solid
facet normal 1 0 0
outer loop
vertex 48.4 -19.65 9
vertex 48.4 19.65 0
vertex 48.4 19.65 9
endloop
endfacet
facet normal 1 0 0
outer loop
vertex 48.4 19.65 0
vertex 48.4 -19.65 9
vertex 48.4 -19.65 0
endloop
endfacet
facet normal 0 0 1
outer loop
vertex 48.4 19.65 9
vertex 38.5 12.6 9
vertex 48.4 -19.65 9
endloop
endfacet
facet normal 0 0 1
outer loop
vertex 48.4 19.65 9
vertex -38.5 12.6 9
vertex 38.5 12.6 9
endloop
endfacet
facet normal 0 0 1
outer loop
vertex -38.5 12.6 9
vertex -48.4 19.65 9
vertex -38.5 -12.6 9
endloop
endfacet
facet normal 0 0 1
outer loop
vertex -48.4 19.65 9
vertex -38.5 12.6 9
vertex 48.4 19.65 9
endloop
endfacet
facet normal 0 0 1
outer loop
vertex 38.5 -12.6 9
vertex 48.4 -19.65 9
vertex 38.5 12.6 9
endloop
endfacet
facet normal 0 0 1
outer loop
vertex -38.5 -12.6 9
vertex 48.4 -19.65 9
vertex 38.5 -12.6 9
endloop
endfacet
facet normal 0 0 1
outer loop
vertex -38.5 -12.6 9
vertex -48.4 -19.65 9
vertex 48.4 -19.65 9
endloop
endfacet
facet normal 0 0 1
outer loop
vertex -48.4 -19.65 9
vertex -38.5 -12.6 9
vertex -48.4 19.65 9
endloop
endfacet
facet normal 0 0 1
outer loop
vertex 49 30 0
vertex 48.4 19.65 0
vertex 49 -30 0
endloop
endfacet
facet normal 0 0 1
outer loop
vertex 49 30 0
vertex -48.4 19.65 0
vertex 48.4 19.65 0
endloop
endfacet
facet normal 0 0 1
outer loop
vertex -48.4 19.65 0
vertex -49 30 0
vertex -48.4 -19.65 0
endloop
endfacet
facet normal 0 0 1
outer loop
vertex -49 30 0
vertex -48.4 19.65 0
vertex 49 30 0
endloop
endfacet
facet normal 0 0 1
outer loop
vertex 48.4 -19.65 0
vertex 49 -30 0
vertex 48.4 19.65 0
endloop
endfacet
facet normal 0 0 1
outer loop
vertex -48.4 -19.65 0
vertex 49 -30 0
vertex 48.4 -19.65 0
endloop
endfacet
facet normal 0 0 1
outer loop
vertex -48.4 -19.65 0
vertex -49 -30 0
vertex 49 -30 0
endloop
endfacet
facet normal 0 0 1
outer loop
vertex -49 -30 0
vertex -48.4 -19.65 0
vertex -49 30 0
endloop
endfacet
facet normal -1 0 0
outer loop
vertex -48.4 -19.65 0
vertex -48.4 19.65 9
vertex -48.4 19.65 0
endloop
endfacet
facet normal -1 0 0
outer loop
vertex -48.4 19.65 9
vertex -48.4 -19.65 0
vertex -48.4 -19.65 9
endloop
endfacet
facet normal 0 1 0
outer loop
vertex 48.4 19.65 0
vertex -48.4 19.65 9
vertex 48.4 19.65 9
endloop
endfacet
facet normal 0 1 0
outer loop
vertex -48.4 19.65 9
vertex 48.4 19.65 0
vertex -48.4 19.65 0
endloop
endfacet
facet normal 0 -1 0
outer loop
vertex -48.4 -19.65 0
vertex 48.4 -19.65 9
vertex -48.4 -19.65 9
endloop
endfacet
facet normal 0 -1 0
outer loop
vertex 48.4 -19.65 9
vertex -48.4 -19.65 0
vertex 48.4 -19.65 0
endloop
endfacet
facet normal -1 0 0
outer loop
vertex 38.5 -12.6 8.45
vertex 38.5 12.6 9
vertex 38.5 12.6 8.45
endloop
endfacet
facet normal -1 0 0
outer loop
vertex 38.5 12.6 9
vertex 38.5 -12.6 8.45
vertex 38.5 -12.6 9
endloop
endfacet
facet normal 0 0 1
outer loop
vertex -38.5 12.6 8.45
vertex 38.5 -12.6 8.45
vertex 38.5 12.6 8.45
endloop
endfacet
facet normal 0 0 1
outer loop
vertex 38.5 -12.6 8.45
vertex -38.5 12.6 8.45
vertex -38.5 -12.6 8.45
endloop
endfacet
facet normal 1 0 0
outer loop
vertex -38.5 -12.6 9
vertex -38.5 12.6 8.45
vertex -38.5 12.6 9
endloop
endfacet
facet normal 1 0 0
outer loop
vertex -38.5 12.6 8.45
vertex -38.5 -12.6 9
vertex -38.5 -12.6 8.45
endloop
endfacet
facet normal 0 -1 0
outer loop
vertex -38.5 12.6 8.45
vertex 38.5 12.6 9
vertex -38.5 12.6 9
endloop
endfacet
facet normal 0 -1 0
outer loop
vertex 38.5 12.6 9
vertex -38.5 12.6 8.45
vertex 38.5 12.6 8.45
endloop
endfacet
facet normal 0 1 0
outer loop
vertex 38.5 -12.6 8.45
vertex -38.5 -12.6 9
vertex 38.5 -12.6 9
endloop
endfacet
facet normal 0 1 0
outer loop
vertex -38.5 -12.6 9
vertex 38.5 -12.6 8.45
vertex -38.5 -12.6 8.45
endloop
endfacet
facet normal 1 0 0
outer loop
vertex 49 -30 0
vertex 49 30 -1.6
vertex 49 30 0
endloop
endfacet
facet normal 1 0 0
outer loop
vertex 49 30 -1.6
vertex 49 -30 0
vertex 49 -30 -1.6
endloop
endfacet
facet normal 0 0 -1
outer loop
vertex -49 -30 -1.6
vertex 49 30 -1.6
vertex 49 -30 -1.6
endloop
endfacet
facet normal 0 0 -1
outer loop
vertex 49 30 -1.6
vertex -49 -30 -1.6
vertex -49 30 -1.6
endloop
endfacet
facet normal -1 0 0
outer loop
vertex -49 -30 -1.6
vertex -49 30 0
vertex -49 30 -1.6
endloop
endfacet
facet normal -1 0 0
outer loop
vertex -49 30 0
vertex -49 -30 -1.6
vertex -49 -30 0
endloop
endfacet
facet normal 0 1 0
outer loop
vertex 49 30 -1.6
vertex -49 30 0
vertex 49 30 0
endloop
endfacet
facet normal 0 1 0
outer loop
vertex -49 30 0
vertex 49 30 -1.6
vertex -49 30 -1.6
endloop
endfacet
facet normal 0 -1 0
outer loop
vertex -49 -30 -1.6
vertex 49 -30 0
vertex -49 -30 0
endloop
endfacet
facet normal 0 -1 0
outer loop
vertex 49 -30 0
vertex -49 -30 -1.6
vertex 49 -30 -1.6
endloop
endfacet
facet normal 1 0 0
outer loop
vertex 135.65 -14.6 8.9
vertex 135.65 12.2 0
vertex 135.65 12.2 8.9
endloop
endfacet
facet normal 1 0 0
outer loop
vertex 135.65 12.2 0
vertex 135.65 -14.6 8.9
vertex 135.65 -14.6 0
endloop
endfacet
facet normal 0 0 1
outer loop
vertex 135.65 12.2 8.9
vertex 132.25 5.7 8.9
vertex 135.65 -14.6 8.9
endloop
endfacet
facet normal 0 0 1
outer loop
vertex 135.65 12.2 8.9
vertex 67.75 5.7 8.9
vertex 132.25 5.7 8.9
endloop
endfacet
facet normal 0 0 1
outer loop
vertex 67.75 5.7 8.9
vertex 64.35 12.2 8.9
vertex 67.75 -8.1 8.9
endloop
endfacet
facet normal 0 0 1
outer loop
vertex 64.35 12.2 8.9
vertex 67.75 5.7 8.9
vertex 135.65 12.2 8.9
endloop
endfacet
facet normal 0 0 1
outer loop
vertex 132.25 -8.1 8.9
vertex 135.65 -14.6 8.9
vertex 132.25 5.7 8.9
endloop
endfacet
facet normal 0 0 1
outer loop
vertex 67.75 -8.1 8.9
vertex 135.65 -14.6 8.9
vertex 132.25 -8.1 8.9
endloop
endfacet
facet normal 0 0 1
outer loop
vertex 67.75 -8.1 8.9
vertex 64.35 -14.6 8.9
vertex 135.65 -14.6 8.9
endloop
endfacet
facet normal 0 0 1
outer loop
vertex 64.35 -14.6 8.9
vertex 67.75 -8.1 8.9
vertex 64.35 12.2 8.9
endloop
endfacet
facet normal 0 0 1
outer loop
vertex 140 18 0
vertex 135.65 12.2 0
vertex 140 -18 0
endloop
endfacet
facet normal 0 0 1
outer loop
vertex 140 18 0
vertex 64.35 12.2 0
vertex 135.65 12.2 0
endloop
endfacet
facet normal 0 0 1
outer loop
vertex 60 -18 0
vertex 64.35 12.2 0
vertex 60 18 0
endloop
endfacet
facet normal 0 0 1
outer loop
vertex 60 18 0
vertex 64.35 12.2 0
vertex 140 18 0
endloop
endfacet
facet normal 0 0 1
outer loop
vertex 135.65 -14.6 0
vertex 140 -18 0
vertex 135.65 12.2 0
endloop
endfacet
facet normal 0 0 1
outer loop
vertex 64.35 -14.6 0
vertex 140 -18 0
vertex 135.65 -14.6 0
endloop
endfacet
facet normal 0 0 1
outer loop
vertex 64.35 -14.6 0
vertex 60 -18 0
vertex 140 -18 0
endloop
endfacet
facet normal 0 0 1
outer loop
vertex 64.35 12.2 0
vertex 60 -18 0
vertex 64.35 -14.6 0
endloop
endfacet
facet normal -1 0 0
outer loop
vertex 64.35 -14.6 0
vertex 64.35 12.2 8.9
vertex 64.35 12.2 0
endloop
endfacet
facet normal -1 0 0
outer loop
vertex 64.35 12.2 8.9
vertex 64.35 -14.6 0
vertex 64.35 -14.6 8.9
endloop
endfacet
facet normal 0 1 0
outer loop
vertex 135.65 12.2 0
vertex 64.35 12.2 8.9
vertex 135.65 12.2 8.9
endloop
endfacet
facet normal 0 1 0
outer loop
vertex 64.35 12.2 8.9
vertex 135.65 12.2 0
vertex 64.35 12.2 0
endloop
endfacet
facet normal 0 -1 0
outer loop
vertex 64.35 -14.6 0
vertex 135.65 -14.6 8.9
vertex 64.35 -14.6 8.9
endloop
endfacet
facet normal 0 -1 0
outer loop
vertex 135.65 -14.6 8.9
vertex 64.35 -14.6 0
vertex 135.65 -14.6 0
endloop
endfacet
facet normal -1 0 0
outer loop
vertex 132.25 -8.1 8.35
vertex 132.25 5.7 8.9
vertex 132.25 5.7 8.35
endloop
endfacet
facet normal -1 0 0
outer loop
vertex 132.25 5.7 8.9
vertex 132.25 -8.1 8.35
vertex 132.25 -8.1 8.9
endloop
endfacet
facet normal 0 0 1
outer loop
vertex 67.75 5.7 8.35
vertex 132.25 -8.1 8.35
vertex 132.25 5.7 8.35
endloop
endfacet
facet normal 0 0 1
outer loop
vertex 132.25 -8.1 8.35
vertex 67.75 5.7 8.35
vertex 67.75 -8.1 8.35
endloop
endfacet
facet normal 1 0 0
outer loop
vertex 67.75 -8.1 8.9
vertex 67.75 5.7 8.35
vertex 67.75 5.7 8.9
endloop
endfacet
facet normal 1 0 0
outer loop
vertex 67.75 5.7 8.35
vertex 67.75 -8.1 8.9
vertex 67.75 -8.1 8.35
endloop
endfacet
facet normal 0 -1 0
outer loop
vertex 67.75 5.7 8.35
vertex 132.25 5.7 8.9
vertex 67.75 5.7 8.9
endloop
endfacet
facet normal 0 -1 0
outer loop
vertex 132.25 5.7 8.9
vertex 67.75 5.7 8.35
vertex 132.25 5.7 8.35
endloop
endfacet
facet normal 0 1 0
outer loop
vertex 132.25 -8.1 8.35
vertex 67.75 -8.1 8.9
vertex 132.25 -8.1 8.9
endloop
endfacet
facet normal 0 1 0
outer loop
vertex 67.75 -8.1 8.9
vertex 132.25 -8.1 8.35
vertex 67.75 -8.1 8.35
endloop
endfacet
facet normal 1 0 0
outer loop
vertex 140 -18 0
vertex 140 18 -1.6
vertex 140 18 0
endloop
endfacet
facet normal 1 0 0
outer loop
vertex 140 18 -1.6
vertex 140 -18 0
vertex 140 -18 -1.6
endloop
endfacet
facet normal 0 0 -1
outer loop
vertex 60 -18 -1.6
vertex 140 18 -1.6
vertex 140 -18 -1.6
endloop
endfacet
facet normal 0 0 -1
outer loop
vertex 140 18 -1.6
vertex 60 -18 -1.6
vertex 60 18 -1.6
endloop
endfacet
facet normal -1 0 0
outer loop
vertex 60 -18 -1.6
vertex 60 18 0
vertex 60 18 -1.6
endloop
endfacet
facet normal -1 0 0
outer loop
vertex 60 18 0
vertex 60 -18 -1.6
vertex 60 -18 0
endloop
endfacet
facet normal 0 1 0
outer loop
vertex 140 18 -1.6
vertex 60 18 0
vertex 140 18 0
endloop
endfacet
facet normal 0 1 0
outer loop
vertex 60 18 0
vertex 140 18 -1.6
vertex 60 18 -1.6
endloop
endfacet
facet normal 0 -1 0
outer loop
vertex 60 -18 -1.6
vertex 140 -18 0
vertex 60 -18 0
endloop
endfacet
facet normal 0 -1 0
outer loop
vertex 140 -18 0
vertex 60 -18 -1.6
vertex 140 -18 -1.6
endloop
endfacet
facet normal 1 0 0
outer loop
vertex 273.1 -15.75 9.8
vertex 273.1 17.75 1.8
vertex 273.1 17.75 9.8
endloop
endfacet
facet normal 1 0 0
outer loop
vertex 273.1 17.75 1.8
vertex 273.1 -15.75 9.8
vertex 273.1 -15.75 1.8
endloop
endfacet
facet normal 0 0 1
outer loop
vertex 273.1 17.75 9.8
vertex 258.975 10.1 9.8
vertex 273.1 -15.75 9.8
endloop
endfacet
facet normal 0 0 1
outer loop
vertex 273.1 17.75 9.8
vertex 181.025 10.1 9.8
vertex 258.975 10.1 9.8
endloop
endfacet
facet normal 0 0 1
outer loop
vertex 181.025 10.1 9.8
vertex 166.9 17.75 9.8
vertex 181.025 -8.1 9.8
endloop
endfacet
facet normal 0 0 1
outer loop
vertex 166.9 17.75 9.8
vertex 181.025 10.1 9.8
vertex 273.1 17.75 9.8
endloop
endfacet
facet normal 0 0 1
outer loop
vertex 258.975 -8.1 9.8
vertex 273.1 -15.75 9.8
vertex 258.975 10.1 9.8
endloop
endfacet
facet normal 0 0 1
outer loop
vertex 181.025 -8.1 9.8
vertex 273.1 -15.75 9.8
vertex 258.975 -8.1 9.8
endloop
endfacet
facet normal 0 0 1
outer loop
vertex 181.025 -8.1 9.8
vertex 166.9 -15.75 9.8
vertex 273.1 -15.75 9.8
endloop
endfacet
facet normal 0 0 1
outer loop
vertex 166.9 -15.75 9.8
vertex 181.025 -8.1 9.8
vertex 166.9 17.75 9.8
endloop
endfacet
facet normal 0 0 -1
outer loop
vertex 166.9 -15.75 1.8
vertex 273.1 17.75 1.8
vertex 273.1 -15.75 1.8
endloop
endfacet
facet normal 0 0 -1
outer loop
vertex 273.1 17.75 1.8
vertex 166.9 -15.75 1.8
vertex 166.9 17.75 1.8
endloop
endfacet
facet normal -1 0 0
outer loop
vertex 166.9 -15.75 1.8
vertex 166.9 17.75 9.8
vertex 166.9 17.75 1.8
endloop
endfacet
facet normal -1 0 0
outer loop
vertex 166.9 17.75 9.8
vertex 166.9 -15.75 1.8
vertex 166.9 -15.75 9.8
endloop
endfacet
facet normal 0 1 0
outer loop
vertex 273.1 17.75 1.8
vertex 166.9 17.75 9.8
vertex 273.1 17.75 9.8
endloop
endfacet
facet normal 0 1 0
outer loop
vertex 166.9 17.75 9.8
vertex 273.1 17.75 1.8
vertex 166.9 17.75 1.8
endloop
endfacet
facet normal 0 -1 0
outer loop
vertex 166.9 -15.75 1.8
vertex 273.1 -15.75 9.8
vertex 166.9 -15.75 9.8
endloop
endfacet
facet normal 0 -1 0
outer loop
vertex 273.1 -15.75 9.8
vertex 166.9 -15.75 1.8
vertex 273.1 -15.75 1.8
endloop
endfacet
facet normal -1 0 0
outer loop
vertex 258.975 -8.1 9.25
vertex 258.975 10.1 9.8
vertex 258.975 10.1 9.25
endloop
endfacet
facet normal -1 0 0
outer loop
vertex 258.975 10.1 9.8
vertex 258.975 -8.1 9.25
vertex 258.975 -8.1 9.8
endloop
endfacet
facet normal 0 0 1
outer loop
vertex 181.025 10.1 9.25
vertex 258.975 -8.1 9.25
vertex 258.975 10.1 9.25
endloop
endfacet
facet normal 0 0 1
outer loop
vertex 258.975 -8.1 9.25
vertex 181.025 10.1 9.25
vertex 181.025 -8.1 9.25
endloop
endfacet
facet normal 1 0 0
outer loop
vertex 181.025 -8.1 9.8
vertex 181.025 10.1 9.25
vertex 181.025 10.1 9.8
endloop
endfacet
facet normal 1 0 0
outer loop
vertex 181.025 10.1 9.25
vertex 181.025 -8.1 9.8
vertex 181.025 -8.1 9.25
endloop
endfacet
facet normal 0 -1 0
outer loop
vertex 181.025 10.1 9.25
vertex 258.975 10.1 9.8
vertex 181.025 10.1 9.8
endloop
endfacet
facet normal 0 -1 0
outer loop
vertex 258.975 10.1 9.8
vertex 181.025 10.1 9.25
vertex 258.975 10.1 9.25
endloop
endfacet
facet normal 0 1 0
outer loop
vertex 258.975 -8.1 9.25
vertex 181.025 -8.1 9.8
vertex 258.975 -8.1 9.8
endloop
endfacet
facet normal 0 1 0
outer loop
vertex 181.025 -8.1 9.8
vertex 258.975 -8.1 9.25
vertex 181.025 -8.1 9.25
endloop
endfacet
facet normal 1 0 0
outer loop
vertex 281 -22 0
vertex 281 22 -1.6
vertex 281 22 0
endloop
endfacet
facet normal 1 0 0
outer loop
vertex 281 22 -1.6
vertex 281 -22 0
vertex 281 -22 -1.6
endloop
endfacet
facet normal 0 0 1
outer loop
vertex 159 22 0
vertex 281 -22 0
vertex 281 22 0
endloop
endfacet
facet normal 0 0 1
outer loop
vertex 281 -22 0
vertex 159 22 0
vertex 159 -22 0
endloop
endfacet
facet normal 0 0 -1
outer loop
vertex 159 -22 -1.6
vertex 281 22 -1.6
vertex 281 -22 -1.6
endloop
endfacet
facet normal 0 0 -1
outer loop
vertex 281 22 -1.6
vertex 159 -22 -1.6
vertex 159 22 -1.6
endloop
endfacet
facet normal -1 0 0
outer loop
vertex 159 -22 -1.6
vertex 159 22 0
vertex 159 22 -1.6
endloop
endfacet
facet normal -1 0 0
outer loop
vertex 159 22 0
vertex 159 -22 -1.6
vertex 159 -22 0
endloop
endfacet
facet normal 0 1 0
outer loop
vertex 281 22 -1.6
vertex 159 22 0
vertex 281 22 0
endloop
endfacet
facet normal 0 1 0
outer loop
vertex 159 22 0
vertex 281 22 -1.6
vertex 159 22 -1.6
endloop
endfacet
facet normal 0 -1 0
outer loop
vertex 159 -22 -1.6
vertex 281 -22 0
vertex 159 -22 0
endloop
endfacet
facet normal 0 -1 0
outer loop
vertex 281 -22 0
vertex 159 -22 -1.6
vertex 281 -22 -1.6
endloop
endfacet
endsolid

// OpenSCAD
LCD_20x4();
translate([100,0,0]) LCD_16x2();
translate([220,0,0]) FutabaVFD();

fudge=0.1;

module LCD_16x2(){
  chars=[16,2];
  chrDim=[2.95,4.35];
  chrPitch=[chrDim.x+0.7,chrDim.y+0.7];
  PCBDim=[80,36,1.6];
  dispDim=[71.3,26.8,8.9];
  viewArea=[64.5,13.8,0.5];
  dispOffset=[PCBDim.x/2-40,PCBDim.y/2-19.2,0]; //offset from lower left edge
  
  //PCB
  color("darkgreen") translate([0,0,-PCBDim.z/2]) cube(PCBDim,true);
  
  //Display
  difference(){
    color("darkSlateGrey") translate(dispOffset+[0,0,dispDim.z/2]) cube(dispDim,true);
    color("blue")translate(dispOffset+[0,0,(dispDim.z-viewArea.z/2)])  
      cube(viewArea+[0,0,fudge],true);    
  }
  //segments
  translate(dispOffset+[0,0,dispDim.z-viewArea.z]) 
    for (ix=[-(chars.x-1)/2:(chars.x-1)/2],iy=[-(chars.y-1)/2:(chars.y-1)/2])
      translate([ix*chrPitch.x,iy*chrPitch.y]) color("lightblue") square(chrDim,true);
}

module LCD_20x4(){
  chars=[20,4];
  chrDim=[2.95,4.75];
  chrPitch=[chrDim.x+0.6,chrDim.y+0.6];
  PCBDim=[98,60,1.6];
  dispDim=[96.8,39.3,9];
  viewArea=[77,25.2,0.5];
  dispOffset=[PCBDim.x/2-49,PCBDim.y/2-39.3/2-10.35,0]; //offset from lower left edge
  
  //PCB
  color("darkgreen") translate([0,0,-PCBDim.z/2]) cube(PCBDim,true);
  
  //Display
  difference(){
    color("darkSlateGrey") translate(dispOffset+[0,0,dispDim.z/2]) cube(dispDim,true);
    color("blue")translate(dispOffset+[0,0,(dispDim.z-viewArea.z/2)])  
      cube(viewArea+[0,0,fudge],true);    
  }
  //segments
  translate(dispOffset+[0,0,dispDim.z-viewArea.z]) 
    for (ix=[-(chars.x-1)/2:(chars.x-1)/2],iy=[-(chars.y-1)/2:(chars.y-1)/2])
      translate([ix*chrPitch.x,iy*chrPitch.y]) color("lightblue") square(chrDim,true);
}


module FutabaVFD(){
  // Type M162MD07AA-000 
  chars=[16,2];
  chrDim=[3.7,8.46];
  chrPitch=[4.95,9.74];
  PCBDim=[122,44,1.6];
  dispDim=[106.2,33.5,8];
  viewArea=[77.95,18.2,0.5];
  //offset from lower left edge of PCB to Display center
  dispOffset=[-(PCBDim.x-dispDim.x)/2,-(PCBDim.y-dispDim.y)/2,0]+[7.9,6.25,1.8]; 
 
  //PCB
  color("darkgreen") translate([0,0,-PCBDim.z/2]) cube(PCBDim,true);
  
  //Display
  difference(){
    color("darkSlateGrey") translate(dispOffset+[0,0,dispDim.z/2]) cube(dispDim,true);
    color("blue")translate(dispOffset+[0,0,(dispDim.z-viewArea.z/2)])  
      cube(viewArea+[0,0,fudge],true);    
  }
  //segments
  translate(dispOffset+[0,0,dispDim.z-viewArea.z]) 
    for (ix=[-(chars.x-1)/2:(chars.x-1)/2],iy=[-(chars.y-1)/2:(chars.y-1)/2])
      translate([ix*chrPitch.x,iy*chrPitch.y]) color("lightblue") square(chrDim,true);
}

module HCS12SS(){
  ovDim=[100,20.5,6.3];
  //Samsung VFD module 
  color("darkSlateGrey") translate([0,0,ovDim.z/2]) cube(ovDim,true);
  for (ix=[-11/2:11/2]) translate([ix*(74/11),0,ovDim.z]) pattern();
  
  module pattern(){
    pxDim=0.45;
    tilt=3;
    pitch=0.6;
    xyOffset=[tan(tilt)*pitch,pitch]; //tan(a)=GK/AK
    frm=[tan(tilt)*4.5,4.5];
    color("cyan") linear_extrude(0.1) 
      polygon([[-4.3/2+frm.x,frm.y],[4.3/2+frm.x,frm.y],
               [4.3/2-frm.x,-frm.y],[-4.3/2-frm.x,-frm.y]]);
    
    *translate(xTilt(1,tilt)) for (i=[0:4])
      translate(xyOffset*i) square(pxDim,true);
  }
}



function xTilt(dist,ang)=[tan(ang)*dist,dist];
